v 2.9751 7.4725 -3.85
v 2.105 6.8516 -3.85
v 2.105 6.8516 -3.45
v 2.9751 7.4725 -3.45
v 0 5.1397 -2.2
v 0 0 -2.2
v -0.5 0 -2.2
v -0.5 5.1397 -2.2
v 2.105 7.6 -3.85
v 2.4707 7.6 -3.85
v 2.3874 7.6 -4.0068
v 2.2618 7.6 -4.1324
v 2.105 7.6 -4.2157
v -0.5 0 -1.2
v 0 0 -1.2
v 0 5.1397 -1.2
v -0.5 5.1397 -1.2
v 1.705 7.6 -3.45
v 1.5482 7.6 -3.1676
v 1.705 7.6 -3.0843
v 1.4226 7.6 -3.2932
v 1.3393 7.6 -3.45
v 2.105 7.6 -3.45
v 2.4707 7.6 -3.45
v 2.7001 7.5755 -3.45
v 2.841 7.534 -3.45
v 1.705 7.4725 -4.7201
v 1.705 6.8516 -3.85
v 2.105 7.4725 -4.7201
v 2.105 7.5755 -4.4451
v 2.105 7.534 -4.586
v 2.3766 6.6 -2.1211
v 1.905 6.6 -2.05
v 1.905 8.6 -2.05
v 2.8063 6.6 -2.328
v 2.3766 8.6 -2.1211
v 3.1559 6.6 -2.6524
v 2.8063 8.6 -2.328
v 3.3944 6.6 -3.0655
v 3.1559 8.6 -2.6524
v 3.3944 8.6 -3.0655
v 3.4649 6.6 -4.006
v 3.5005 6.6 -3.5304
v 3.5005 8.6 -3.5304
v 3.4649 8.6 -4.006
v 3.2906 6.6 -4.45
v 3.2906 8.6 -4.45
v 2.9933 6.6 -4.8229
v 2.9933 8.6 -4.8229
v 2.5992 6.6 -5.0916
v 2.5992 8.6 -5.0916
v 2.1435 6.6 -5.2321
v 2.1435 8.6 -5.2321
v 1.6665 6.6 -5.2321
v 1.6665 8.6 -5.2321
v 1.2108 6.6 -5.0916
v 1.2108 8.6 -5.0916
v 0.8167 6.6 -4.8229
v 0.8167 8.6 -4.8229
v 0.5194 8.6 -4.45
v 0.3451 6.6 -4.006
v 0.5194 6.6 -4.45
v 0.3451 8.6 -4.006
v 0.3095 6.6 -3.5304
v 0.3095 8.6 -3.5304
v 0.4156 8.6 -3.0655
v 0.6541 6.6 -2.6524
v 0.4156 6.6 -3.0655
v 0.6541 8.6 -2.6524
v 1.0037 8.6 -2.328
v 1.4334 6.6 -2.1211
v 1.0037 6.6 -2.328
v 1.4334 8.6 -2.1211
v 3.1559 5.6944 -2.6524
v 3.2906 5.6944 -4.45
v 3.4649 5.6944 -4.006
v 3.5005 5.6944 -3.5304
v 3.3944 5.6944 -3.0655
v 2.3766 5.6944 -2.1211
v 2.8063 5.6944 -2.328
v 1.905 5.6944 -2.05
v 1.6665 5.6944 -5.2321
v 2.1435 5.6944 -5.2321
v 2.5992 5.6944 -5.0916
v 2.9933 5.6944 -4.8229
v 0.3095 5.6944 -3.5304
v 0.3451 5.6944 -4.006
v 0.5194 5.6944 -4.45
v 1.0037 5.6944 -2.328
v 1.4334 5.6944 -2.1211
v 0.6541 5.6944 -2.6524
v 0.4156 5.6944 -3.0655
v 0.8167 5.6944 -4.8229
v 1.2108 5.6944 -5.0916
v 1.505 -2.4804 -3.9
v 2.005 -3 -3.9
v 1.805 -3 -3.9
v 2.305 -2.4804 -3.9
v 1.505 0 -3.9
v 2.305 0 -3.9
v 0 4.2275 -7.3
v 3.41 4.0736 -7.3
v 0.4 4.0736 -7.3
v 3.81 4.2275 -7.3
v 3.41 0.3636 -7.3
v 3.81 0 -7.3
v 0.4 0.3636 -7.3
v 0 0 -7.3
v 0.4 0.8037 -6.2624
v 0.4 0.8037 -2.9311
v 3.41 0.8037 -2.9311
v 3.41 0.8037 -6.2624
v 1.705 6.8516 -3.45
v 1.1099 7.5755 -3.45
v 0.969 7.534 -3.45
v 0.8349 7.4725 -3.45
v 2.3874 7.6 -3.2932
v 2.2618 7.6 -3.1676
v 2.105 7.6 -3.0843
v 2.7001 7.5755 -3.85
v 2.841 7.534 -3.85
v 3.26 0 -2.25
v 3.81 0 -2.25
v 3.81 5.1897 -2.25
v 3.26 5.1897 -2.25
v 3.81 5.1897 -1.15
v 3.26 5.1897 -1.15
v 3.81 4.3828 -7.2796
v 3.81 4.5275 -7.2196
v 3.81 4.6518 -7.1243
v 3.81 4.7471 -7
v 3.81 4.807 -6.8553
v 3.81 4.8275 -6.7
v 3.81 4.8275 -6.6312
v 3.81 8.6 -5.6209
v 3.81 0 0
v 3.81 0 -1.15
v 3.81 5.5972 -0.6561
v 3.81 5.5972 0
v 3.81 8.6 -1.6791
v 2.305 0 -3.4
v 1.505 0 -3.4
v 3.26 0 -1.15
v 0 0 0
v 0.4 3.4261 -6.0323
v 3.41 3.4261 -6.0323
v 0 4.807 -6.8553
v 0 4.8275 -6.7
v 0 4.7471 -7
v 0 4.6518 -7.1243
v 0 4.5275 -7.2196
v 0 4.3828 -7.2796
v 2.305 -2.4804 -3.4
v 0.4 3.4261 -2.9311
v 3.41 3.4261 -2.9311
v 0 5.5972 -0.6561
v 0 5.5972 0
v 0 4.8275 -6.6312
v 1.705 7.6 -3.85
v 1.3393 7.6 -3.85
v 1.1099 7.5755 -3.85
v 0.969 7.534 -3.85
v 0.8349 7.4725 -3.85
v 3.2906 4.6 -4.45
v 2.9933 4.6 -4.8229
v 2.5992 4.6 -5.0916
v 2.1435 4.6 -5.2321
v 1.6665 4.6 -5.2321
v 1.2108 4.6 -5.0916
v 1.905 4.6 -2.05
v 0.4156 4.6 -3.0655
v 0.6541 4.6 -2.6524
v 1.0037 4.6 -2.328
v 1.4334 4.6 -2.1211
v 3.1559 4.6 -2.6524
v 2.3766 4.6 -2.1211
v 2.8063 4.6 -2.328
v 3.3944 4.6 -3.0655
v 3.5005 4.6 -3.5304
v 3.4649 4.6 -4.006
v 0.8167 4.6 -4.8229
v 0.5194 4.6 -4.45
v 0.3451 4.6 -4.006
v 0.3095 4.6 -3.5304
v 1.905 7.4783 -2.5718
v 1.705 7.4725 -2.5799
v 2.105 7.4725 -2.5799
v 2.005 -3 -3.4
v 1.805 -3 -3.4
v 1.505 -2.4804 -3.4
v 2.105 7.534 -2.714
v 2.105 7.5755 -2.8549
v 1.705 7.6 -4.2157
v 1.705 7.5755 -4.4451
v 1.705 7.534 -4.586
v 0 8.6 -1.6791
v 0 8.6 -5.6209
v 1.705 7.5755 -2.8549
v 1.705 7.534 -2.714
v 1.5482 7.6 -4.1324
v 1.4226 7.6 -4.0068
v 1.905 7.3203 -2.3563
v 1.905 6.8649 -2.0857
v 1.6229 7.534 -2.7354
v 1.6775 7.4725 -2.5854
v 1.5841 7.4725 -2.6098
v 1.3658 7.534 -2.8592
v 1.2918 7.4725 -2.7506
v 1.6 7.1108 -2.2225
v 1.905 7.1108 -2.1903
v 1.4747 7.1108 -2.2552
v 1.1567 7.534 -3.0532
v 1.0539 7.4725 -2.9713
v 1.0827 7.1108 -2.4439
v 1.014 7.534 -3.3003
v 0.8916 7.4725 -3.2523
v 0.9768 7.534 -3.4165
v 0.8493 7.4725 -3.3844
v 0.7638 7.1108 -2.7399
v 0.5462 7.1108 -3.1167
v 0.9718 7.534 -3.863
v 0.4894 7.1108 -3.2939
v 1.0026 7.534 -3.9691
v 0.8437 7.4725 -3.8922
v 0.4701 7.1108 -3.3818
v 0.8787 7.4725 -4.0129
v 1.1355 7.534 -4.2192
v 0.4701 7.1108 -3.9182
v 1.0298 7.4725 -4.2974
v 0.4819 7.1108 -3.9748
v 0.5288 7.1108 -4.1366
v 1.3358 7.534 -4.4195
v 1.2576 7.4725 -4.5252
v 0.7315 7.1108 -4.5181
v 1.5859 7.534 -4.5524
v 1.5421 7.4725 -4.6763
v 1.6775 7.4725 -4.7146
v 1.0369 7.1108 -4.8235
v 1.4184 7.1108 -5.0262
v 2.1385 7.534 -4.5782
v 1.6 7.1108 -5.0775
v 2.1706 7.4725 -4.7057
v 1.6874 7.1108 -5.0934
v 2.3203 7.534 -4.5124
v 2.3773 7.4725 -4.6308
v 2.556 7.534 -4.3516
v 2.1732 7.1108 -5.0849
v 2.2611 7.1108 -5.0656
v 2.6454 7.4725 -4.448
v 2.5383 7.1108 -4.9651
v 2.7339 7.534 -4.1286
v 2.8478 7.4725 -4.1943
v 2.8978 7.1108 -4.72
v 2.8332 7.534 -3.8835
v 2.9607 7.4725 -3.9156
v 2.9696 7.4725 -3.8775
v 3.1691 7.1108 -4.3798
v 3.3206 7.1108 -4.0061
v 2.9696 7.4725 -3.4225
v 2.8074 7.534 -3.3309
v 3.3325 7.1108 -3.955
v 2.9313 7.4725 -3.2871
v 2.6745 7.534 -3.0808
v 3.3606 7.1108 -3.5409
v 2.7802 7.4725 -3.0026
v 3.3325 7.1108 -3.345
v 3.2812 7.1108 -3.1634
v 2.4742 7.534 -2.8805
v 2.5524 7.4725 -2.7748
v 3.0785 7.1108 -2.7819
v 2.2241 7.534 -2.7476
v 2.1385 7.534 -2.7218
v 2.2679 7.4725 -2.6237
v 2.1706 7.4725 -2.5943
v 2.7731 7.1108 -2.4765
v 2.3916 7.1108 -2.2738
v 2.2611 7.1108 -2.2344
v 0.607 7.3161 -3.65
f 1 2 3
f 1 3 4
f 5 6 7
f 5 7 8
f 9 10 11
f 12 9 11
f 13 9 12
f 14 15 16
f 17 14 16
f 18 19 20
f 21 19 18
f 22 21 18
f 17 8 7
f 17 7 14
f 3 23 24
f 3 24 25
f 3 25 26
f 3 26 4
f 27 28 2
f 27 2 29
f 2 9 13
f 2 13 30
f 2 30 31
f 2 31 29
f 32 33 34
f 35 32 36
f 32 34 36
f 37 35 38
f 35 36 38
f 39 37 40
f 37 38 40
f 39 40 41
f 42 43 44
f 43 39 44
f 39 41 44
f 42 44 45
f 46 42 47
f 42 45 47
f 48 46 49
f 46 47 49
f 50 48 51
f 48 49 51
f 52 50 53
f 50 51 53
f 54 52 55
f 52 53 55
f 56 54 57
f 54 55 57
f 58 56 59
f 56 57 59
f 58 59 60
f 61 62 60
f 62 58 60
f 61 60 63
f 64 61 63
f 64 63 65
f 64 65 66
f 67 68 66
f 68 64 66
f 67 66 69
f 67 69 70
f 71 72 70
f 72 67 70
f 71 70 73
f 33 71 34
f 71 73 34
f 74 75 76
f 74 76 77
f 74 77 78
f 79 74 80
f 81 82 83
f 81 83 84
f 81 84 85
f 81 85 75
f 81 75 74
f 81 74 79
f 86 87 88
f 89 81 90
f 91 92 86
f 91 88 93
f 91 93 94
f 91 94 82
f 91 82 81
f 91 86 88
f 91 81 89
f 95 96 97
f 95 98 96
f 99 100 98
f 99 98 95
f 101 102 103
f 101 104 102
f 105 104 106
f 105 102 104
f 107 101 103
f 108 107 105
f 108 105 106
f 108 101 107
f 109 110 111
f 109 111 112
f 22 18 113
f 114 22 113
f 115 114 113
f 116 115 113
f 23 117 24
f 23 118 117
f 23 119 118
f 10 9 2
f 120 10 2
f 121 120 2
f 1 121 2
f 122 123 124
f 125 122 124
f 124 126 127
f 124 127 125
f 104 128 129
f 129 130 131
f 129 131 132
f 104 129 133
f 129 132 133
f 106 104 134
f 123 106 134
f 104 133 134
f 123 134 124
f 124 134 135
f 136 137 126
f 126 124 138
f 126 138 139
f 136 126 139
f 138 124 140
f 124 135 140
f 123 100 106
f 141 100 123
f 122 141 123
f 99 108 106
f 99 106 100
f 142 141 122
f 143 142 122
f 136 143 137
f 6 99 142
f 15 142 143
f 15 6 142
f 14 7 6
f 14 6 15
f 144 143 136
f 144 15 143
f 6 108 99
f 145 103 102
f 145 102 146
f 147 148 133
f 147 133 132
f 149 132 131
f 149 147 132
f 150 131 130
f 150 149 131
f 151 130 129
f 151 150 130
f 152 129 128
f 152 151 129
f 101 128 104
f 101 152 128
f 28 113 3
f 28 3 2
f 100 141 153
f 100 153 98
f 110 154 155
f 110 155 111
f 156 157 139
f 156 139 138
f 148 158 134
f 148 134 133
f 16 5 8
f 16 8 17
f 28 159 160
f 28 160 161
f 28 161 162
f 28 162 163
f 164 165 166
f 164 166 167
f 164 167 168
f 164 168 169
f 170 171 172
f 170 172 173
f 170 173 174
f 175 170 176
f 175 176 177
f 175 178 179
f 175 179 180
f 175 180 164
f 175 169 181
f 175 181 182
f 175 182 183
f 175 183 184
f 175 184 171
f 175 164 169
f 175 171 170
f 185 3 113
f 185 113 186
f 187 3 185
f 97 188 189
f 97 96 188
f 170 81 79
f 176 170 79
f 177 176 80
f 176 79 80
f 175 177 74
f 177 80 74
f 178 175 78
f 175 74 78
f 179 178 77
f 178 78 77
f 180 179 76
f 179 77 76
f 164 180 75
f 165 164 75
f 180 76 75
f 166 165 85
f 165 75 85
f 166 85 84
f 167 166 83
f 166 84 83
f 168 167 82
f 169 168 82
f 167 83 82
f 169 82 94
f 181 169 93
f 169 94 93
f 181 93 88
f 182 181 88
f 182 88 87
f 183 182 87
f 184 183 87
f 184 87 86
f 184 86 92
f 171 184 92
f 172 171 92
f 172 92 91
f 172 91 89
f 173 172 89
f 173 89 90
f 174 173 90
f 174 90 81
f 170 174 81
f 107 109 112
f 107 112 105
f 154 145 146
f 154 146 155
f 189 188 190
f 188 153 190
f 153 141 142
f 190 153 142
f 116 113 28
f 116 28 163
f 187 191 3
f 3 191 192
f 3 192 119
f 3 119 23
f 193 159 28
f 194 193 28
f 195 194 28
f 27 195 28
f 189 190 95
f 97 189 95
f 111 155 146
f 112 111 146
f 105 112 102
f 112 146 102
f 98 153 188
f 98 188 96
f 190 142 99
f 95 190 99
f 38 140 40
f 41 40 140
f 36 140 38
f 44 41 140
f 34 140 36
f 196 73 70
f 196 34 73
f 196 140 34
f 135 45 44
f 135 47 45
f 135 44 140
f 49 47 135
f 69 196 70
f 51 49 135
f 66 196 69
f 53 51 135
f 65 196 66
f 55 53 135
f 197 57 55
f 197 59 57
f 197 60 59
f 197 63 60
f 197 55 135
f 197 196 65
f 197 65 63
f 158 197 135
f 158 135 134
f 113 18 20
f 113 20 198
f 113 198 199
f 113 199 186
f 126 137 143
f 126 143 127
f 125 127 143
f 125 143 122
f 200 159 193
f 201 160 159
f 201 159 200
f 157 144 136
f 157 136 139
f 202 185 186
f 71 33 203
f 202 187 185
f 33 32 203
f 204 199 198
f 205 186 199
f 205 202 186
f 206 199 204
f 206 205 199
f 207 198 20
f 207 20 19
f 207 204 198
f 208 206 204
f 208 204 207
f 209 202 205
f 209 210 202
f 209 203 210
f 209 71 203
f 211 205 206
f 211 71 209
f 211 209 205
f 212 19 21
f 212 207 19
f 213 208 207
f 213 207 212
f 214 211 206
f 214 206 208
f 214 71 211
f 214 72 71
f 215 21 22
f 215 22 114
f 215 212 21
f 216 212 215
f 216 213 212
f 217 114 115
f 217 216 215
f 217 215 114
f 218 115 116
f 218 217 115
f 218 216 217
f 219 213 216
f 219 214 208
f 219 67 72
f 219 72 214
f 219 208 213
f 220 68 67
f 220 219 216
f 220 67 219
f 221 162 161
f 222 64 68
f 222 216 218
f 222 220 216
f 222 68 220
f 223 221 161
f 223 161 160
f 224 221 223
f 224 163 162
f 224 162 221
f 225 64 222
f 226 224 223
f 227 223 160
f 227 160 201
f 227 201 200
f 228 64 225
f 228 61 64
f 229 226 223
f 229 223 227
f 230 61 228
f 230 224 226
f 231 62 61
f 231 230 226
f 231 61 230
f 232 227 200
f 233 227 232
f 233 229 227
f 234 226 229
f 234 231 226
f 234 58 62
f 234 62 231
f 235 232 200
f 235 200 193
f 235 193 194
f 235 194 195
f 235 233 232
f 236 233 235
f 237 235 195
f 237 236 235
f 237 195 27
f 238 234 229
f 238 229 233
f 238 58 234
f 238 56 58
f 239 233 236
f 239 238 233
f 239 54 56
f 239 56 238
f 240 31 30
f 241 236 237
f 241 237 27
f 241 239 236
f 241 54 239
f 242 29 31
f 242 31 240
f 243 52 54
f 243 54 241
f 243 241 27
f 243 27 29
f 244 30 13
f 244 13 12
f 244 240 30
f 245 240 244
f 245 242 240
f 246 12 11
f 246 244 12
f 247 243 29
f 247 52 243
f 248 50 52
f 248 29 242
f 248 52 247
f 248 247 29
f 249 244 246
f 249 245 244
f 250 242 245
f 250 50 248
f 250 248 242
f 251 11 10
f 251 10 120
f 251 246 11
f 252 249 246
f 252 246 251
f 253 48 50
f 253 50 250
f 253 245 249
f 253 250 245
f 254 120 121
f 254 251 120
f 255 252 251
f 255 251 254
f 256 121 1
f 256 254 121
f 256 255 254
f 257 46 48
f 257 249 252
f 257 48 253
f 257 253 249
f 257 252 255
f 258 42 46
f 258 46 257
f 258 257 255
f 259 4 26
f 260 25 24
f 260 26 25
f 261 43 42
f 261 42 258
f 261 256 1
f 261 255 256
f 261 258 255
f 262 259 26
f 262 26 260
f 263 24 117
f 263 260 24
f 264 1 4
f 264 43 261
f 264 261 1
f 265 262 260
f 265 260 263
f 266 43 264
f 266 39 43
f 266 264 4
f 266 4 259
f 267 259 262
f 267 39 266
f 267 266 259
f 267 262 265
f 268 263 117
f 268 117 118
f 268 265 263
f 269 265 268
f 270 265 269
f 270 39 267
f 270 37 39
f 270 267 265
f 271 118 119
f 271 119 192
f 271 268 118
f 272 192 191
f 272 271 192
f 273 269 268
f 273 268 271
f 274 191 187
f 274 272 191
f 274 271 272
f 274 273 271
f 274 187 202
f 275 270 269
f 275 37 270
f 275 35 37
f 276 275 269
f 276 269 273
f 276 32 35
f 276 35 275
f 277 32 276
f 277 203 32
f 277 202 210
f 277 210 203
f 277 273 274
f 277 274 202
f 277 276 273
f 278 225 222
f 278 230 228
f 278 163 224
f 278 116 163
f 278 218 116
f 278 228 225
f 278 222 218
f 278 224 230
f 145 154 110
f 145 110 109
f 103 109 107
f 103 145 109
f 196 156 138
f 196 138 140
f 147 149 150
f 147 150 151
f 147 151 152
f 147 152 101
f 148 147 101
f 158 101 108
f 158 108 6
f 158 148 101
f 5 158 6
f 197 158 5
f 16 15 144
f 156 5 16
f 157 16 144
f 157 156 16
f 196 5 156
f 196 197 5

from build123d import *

# Parameters (mm, degrees)
BOSS_EXTRUDE1_DEPTH      = 3.81
CUT_EXTRUDE_1_DEPTH      = 3.01
SKETCH_4_R               = 1.6
CUT_EXTRUDE_2_DEPTH      = 4
SKETCH_7_W               = 1
SKETCH_7_H               = 5.139654773
EXTRUDE_1_DEPTH          = 0.5
SKETCH_8_W               = 1.1
SKETCH_8_H               = 5.189654773
CUT_EXTRUDE_4_DEPTH      = 0.55
SKETCH_10_W              = 0.8
SKETCH_10_H              = 0.5
EXTRUDE_2_DEPTH          = 3
CHAMFER_2_SIZE           = 0.3
CHAMFER_2_SIZE2          = 0.519615242
CHAMFER_3_SIZE           = 0.3
CHAMFER_3_SIZE2          = 0.519615242
CUT_EXTRUDE_START        = 0.2
CUT_EXTRUDE_5_DEPTH      = 0.4
PATTERN_CIRCULAR_1_COUNT = 4


with BuildPart() as part:
    # Sketch1 → Boss-Extrude1 (new body)
    with BuildSketch(Plane(origin=(0, 0, 0), x_dir=(0, 0, -1), z_dir=(1, 0, 0))):
        with BuildLine():
            Line((5.620897226, 8.6), (6.631206986, 4.827492088))
            Line((6.631206986, 4.827492088), (6.7, 4.827492088))
            ThreePointArc((6.7, 4.827492088), (7.124264069, 4.651756157), (7.3, 4.227492088))
            Line((7.3, 4.227492088), (7.3, 0))
            Line((7.3, 0), (0, 0))
            Line((0, 0), (0, 5.59717585))
            Line((0, 5.59717585), (0.656126643, 5.59717585))
            Line((0.656126643, 5.59717585), (1.679102774, 8.6))
            Line((1.679102774, 8.6), (5.620897226, 8.6))
        make_face()
    extrude(amount=BOSS_EXTRUDE1_DEPTH)

    # Эскиз2 → Вырез-Вытянуть1 (cut)
    with BuildSketch(Plane.ZY.offset(-0.4)):
        Polygon((-7.3, 4.073586509), (-6.032317297, 3.426147995), (-2.931105615, 3.426147995), (-2.931105615, 0.803691629), (-6.262387876, 0.803691629), (-7.3, 0.36356395), align=None)
    extrude(amount=-CUT_EXTRUDE_1_DEPTH, mode=Mode.SUBTRACT)

    # Эскиз4 → Вырез-Вытянуть2 (cut)
    with BuildSketch(Plane(origin=(0, 8.6, 0), x_dir=(1, 0, 0), z_dir=(0, 1, 0))):
        with Locations((1.905, 3.65)):
            Circle(SKETCH_4_R)
    extrude(amount=-CUT_EXTRUDE_2_DEPTH, mode=Mode.SUBTRACT)

    # Эскиз5 → Повернуть1 (revolve)
    with BuildSketch(Plane.ZY.offset(-1.905)):
        with BuildLine():
            Line((-3.65, 7.6), (-4.25, 7.6))
            ThreePointArc((-4.25, 7.6), (-4.957106781, 7.307106781), (-5.25, 6.6))
            Line((-5.25, 6.6), (-5.25, 5.694446069))
            Line((-5.25, 5.694446069), (-3.65, 5.694446069))
            Line((-3.65, 5.694446069), (-3.65, 7.6))
        make_face()
    revolve(axis=Axis((1.905, 7.6, -3.65), (0, -1, 0)))

    # Эскиз7 → Бобышка-Вытянуть1 (add)
    with BuildSketch(Plane.ZY):
        with Locations((-1.7, 2.569827387)):
            Rectangle(SKETCH_7_W, SKETCH_7_H)
    extrude(amount=EXTRUDE_1_DEPTH)

    # Эскиз8 → Вырез-Вытянуть4 (cut)
    with BuildSketch(Plane(origin=(3.81, 0, 0), x_dir=(0, 0, -1), z_dir=(1, 0, 0))):
        with Locations((1.7, 2.594827386)):
            Rectangle(SKETCH_8_W, SKETCH_8_H)
    extrude(amount=-CUT_EXTRUDE_4_DEPTH, mode=Mode.SUBTRACT)

    # Эскиз10 → Бобышка-Вытянуть2 (add)
    with BuildSketch(Plane(origin=(0, 0, 0), x_dir=(-1, 0, 0), z_dir=(0, -1, 0))):
        with Locations((-1.905, 3.65)):
            Rectangle(SKETCH_10_W, SKETCH_10_H)
    extrude(amount=EXTRUDE_2_DEPTH)

    # Фаска2
    chamfer_2_edges = [part.edges().sort_by_distance(p)[0] for p in [
        (1.505, -3, -3.65),
    ]]
    chamfer_2_side = [part.faces().sort_by_distance(p)[0] for p in [
        (1.905, -3, -3.65),
    ]]
    chamfer(chamfer_2_edges, length=CHAMFER_2_SIZE, length2=CHAMFER_2_SIZE2, reference=chamfer_2_side[0])

    # Фаска3
    chamfer_3_edges = [part.edges().sort_by_distance(p)[0] for p in [
        (2.305, -3, -3.65),
    ]]
    chamfer_3_side = [part.faces().sort_by_distance(p)[0] for p in [
        (2.055, -3, -3.65),
    ]]
    chamfer(chamfer_3_edges, length=CHAMFER_3_SIZE, length2=CHAMFER_3_SIZE2, reference=chamfer_3_side[0])

    # Эскиз11 → Вырез-Вытянуть5 (cut)
    with BuildSketch(Plane.ZY.offset(-1.905).offset(CUT_EXTRUDE_START)):
        Polygon((-4.909756217, 7.996241993), (-3.65, 7.996241993), (-3.65, 6.851621262), (-3.85, 6.851621262), (-4.909756217, 7.607858699), align=None)
    cut_extrude_5 = extrude(amount=-CUT_EXTRUDE_5_DEPTH, mode=Mode.SUBTRACT)

    # Круговой массив1: Вырез-Вытянуть5 ×4 about axis
    pattern_circular_1_axis = Axis((1.905, 6.6, -3.65), (0, 1, 0))
    for i in range(1, PATTERN_CIRCULAR_1_COUNT):
        add(cut_extrude_5.rotate(pattern_circular_1_axis, i * 360 / PATTERN_CIRCULAR_1_COUNT), mode=Mode.SUBTRACT)


solid = part.part
